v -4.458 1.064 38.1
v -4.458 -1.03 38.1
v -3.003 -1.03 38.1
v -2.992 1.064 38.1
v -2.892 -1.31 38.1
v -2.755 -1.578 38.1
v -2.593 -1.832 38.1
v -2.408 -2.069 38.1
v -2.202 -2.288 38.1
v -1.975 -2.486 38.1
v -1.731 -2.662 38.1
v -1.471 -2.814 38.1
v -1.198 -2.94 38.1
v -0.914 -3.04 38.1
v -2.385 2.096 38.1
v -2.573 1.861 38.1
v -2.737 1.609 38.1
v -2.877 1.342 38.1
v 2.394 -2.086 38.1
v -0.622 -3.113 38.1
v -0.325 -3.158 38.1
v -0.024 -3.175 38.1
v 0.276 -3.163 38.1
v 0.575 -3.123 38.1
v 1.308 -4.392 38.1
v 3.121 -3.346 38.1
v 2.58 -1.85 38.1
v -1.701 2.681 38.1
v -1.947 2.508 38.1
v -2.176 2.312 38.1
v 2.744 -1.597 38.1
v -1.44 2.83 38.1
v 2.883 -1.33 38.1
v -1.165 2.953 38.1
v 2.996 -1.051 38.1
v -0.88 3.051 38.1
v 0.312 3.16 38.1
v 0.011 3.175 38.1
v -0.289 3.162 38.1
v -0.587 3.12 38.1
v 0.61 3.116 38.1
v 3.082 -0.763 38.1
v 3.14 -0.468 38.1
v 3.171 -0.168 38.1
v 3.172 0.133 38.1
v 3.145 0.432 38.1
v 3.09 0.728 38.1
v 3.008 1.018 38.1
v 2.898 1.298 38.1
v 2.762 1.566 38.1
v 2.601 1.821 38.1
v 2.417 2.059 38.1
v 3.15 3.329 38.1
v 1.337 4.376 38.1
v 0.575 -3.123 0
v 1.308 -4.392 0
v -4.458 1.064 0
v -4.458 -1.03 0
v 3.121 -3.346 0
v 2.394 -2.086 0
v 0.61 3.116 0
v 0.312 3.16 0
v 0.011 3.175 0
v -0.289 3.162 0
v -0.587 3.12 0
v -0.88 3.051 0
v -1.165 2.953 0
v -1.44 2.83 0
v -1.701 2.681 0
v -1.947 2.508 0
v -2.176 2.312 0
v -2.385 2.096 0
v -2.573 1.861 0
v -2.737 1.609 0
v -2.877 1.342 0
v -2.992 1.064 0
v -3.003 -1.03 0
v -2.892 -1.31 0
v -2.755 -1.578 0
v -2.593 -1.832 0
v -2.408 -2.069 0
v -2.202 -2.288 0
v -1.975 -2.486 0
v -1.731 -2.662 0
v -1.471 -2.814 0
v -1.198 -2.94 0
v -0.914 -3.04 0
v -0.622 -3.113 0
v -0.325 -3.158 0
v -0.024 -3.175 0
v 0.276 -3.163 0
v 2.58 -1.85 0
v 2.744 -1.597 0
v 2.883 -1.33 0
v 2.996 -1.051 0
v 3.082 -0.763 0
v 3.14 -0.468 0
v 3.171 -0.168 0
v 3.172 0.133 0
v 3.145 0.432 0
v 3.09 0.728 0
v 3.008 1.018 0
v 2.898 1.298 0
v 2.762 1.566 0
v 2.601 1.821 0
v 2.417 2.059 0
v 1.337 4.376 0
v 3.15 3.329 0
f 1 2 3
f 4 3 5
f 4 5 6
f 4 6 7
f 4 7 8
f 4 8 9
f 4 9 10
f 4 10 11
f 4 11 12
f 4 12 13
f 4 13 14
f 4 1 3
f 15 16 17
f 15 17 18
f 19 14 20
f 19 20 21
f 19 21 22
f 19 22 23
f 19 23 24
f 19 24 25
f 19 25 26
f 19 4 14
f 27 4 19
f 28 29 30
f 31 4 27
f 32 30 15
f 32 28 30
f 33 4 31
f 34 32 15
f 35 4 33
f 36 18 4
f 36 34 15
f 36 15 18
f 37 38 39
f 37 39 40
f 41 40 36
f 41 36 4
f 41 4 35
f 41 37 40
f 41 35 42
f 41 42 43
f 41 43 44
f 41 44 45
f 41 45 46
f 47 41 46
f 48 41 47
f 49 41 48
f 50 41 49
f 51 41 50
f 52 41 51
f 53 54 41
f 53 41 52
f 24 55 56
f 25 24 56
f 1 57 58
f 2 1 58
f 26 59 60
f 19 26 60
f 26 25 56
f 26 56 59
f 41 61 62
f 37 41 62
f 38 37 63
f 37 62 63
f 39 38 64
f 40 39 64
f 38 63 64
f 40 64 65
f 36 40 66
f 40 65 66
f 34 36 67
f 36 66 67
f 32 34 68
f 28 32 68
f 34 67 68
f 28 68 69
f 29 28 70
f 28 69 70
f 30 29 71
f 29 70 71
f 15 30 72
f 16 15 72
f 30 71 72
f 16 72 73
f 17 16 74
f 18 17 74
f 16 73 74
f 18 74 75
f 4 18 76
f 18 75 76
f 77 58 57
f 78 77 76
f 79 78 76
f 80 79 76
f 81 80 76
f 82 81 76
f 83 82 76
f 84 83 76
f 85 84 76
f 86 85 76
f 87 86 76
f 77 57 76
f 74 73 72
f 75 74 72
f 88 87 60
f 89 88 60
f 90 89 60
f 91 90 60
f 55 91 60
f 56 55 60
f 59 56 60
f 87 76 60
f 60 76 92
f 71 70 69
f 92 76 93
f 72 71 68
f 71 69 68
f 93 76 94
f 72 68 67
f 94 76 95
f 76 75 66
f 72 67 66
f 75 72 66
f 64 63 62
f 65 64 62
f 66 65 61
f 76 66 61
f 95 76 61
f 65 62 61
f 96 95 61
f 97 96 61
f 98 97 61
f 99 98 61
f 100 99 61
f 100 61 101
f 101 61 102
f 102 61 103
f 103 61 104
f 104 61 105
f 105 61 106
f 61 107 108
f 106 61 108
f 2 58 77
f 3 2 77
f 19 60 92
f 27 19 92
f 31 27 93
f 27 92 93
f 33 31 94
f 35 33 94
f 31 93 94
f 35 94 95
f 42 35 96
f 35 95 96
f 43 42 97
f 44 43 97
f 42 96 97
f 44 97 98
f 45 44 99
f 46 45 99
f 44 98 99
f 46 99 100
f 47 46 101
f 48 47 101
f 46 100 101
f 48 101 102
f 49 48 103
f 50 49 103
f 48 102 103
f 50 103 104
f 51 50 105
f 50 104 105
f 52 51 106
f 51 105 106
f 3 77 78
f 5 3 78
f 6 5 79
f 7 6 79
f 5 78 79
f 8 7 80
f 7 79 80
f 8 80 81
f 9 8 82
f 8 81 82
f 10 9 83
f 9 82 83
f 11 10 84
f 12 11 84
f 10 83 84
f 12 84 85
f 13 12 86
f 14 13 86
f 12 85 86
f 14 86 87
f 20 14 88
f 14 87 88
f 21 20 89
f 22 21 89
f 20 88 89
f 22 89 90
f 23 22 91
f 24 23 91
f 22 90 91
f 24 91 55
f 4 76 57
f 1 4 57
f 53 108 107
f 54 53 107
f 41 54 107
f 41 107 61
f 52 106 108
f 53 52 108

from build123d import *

# Parameters (mm, degrees)
EXTRUSION1_DEPTH = 38.1


with BuildPart() as part:
    # Sketch1 → Extrusion1 (new body)
    with BuildSketch(Plane.XY):
        with BuildLine():
            Line((2.416962135, 2.058863531), (3.1501433, 3.32877056))
            Line((3.1501433, 3.32877056), (1.336888207, 4.375653876))
            Line((1.336888207, 4.375653876), (0.609587103, 3.115931412))
            ThreePointArc((0.609587103, 3.115931412), (-1.572031269, 2.758503705), (-2.991509188, 1.063718843))
            Line((-2.991509188, 1.063718843), (-4.457871519, 1.063718843))
            Line((-4.457871519, 1.063718843), (-4.457871519, -1.030047788))
            Line((-4.457871519, -1.030047788), (-3.003269311, -1.030047788))
            ThreePointArc((-3.003269311, -1.030047788), (-1.60291865, -2.740670867), (0.574547053, -3.122582374))
            Line((0.574547053, -3.122582374), (1.307728219, -4.392489404))
            Line((1.307728219, -4.392489404), (3.120983311, -3.345606088))
            Line((3.120983311, -3.345606088), (2.393682207, -2.085883623))
            ThreePointArc((2.393682207, -2.085883623), (3.174949919, -0.017832838), (2.416962135, 2.058863531))
        make_face()
    extrude(amount=EXTRUSION1_DEPTH)


solid = part.part
